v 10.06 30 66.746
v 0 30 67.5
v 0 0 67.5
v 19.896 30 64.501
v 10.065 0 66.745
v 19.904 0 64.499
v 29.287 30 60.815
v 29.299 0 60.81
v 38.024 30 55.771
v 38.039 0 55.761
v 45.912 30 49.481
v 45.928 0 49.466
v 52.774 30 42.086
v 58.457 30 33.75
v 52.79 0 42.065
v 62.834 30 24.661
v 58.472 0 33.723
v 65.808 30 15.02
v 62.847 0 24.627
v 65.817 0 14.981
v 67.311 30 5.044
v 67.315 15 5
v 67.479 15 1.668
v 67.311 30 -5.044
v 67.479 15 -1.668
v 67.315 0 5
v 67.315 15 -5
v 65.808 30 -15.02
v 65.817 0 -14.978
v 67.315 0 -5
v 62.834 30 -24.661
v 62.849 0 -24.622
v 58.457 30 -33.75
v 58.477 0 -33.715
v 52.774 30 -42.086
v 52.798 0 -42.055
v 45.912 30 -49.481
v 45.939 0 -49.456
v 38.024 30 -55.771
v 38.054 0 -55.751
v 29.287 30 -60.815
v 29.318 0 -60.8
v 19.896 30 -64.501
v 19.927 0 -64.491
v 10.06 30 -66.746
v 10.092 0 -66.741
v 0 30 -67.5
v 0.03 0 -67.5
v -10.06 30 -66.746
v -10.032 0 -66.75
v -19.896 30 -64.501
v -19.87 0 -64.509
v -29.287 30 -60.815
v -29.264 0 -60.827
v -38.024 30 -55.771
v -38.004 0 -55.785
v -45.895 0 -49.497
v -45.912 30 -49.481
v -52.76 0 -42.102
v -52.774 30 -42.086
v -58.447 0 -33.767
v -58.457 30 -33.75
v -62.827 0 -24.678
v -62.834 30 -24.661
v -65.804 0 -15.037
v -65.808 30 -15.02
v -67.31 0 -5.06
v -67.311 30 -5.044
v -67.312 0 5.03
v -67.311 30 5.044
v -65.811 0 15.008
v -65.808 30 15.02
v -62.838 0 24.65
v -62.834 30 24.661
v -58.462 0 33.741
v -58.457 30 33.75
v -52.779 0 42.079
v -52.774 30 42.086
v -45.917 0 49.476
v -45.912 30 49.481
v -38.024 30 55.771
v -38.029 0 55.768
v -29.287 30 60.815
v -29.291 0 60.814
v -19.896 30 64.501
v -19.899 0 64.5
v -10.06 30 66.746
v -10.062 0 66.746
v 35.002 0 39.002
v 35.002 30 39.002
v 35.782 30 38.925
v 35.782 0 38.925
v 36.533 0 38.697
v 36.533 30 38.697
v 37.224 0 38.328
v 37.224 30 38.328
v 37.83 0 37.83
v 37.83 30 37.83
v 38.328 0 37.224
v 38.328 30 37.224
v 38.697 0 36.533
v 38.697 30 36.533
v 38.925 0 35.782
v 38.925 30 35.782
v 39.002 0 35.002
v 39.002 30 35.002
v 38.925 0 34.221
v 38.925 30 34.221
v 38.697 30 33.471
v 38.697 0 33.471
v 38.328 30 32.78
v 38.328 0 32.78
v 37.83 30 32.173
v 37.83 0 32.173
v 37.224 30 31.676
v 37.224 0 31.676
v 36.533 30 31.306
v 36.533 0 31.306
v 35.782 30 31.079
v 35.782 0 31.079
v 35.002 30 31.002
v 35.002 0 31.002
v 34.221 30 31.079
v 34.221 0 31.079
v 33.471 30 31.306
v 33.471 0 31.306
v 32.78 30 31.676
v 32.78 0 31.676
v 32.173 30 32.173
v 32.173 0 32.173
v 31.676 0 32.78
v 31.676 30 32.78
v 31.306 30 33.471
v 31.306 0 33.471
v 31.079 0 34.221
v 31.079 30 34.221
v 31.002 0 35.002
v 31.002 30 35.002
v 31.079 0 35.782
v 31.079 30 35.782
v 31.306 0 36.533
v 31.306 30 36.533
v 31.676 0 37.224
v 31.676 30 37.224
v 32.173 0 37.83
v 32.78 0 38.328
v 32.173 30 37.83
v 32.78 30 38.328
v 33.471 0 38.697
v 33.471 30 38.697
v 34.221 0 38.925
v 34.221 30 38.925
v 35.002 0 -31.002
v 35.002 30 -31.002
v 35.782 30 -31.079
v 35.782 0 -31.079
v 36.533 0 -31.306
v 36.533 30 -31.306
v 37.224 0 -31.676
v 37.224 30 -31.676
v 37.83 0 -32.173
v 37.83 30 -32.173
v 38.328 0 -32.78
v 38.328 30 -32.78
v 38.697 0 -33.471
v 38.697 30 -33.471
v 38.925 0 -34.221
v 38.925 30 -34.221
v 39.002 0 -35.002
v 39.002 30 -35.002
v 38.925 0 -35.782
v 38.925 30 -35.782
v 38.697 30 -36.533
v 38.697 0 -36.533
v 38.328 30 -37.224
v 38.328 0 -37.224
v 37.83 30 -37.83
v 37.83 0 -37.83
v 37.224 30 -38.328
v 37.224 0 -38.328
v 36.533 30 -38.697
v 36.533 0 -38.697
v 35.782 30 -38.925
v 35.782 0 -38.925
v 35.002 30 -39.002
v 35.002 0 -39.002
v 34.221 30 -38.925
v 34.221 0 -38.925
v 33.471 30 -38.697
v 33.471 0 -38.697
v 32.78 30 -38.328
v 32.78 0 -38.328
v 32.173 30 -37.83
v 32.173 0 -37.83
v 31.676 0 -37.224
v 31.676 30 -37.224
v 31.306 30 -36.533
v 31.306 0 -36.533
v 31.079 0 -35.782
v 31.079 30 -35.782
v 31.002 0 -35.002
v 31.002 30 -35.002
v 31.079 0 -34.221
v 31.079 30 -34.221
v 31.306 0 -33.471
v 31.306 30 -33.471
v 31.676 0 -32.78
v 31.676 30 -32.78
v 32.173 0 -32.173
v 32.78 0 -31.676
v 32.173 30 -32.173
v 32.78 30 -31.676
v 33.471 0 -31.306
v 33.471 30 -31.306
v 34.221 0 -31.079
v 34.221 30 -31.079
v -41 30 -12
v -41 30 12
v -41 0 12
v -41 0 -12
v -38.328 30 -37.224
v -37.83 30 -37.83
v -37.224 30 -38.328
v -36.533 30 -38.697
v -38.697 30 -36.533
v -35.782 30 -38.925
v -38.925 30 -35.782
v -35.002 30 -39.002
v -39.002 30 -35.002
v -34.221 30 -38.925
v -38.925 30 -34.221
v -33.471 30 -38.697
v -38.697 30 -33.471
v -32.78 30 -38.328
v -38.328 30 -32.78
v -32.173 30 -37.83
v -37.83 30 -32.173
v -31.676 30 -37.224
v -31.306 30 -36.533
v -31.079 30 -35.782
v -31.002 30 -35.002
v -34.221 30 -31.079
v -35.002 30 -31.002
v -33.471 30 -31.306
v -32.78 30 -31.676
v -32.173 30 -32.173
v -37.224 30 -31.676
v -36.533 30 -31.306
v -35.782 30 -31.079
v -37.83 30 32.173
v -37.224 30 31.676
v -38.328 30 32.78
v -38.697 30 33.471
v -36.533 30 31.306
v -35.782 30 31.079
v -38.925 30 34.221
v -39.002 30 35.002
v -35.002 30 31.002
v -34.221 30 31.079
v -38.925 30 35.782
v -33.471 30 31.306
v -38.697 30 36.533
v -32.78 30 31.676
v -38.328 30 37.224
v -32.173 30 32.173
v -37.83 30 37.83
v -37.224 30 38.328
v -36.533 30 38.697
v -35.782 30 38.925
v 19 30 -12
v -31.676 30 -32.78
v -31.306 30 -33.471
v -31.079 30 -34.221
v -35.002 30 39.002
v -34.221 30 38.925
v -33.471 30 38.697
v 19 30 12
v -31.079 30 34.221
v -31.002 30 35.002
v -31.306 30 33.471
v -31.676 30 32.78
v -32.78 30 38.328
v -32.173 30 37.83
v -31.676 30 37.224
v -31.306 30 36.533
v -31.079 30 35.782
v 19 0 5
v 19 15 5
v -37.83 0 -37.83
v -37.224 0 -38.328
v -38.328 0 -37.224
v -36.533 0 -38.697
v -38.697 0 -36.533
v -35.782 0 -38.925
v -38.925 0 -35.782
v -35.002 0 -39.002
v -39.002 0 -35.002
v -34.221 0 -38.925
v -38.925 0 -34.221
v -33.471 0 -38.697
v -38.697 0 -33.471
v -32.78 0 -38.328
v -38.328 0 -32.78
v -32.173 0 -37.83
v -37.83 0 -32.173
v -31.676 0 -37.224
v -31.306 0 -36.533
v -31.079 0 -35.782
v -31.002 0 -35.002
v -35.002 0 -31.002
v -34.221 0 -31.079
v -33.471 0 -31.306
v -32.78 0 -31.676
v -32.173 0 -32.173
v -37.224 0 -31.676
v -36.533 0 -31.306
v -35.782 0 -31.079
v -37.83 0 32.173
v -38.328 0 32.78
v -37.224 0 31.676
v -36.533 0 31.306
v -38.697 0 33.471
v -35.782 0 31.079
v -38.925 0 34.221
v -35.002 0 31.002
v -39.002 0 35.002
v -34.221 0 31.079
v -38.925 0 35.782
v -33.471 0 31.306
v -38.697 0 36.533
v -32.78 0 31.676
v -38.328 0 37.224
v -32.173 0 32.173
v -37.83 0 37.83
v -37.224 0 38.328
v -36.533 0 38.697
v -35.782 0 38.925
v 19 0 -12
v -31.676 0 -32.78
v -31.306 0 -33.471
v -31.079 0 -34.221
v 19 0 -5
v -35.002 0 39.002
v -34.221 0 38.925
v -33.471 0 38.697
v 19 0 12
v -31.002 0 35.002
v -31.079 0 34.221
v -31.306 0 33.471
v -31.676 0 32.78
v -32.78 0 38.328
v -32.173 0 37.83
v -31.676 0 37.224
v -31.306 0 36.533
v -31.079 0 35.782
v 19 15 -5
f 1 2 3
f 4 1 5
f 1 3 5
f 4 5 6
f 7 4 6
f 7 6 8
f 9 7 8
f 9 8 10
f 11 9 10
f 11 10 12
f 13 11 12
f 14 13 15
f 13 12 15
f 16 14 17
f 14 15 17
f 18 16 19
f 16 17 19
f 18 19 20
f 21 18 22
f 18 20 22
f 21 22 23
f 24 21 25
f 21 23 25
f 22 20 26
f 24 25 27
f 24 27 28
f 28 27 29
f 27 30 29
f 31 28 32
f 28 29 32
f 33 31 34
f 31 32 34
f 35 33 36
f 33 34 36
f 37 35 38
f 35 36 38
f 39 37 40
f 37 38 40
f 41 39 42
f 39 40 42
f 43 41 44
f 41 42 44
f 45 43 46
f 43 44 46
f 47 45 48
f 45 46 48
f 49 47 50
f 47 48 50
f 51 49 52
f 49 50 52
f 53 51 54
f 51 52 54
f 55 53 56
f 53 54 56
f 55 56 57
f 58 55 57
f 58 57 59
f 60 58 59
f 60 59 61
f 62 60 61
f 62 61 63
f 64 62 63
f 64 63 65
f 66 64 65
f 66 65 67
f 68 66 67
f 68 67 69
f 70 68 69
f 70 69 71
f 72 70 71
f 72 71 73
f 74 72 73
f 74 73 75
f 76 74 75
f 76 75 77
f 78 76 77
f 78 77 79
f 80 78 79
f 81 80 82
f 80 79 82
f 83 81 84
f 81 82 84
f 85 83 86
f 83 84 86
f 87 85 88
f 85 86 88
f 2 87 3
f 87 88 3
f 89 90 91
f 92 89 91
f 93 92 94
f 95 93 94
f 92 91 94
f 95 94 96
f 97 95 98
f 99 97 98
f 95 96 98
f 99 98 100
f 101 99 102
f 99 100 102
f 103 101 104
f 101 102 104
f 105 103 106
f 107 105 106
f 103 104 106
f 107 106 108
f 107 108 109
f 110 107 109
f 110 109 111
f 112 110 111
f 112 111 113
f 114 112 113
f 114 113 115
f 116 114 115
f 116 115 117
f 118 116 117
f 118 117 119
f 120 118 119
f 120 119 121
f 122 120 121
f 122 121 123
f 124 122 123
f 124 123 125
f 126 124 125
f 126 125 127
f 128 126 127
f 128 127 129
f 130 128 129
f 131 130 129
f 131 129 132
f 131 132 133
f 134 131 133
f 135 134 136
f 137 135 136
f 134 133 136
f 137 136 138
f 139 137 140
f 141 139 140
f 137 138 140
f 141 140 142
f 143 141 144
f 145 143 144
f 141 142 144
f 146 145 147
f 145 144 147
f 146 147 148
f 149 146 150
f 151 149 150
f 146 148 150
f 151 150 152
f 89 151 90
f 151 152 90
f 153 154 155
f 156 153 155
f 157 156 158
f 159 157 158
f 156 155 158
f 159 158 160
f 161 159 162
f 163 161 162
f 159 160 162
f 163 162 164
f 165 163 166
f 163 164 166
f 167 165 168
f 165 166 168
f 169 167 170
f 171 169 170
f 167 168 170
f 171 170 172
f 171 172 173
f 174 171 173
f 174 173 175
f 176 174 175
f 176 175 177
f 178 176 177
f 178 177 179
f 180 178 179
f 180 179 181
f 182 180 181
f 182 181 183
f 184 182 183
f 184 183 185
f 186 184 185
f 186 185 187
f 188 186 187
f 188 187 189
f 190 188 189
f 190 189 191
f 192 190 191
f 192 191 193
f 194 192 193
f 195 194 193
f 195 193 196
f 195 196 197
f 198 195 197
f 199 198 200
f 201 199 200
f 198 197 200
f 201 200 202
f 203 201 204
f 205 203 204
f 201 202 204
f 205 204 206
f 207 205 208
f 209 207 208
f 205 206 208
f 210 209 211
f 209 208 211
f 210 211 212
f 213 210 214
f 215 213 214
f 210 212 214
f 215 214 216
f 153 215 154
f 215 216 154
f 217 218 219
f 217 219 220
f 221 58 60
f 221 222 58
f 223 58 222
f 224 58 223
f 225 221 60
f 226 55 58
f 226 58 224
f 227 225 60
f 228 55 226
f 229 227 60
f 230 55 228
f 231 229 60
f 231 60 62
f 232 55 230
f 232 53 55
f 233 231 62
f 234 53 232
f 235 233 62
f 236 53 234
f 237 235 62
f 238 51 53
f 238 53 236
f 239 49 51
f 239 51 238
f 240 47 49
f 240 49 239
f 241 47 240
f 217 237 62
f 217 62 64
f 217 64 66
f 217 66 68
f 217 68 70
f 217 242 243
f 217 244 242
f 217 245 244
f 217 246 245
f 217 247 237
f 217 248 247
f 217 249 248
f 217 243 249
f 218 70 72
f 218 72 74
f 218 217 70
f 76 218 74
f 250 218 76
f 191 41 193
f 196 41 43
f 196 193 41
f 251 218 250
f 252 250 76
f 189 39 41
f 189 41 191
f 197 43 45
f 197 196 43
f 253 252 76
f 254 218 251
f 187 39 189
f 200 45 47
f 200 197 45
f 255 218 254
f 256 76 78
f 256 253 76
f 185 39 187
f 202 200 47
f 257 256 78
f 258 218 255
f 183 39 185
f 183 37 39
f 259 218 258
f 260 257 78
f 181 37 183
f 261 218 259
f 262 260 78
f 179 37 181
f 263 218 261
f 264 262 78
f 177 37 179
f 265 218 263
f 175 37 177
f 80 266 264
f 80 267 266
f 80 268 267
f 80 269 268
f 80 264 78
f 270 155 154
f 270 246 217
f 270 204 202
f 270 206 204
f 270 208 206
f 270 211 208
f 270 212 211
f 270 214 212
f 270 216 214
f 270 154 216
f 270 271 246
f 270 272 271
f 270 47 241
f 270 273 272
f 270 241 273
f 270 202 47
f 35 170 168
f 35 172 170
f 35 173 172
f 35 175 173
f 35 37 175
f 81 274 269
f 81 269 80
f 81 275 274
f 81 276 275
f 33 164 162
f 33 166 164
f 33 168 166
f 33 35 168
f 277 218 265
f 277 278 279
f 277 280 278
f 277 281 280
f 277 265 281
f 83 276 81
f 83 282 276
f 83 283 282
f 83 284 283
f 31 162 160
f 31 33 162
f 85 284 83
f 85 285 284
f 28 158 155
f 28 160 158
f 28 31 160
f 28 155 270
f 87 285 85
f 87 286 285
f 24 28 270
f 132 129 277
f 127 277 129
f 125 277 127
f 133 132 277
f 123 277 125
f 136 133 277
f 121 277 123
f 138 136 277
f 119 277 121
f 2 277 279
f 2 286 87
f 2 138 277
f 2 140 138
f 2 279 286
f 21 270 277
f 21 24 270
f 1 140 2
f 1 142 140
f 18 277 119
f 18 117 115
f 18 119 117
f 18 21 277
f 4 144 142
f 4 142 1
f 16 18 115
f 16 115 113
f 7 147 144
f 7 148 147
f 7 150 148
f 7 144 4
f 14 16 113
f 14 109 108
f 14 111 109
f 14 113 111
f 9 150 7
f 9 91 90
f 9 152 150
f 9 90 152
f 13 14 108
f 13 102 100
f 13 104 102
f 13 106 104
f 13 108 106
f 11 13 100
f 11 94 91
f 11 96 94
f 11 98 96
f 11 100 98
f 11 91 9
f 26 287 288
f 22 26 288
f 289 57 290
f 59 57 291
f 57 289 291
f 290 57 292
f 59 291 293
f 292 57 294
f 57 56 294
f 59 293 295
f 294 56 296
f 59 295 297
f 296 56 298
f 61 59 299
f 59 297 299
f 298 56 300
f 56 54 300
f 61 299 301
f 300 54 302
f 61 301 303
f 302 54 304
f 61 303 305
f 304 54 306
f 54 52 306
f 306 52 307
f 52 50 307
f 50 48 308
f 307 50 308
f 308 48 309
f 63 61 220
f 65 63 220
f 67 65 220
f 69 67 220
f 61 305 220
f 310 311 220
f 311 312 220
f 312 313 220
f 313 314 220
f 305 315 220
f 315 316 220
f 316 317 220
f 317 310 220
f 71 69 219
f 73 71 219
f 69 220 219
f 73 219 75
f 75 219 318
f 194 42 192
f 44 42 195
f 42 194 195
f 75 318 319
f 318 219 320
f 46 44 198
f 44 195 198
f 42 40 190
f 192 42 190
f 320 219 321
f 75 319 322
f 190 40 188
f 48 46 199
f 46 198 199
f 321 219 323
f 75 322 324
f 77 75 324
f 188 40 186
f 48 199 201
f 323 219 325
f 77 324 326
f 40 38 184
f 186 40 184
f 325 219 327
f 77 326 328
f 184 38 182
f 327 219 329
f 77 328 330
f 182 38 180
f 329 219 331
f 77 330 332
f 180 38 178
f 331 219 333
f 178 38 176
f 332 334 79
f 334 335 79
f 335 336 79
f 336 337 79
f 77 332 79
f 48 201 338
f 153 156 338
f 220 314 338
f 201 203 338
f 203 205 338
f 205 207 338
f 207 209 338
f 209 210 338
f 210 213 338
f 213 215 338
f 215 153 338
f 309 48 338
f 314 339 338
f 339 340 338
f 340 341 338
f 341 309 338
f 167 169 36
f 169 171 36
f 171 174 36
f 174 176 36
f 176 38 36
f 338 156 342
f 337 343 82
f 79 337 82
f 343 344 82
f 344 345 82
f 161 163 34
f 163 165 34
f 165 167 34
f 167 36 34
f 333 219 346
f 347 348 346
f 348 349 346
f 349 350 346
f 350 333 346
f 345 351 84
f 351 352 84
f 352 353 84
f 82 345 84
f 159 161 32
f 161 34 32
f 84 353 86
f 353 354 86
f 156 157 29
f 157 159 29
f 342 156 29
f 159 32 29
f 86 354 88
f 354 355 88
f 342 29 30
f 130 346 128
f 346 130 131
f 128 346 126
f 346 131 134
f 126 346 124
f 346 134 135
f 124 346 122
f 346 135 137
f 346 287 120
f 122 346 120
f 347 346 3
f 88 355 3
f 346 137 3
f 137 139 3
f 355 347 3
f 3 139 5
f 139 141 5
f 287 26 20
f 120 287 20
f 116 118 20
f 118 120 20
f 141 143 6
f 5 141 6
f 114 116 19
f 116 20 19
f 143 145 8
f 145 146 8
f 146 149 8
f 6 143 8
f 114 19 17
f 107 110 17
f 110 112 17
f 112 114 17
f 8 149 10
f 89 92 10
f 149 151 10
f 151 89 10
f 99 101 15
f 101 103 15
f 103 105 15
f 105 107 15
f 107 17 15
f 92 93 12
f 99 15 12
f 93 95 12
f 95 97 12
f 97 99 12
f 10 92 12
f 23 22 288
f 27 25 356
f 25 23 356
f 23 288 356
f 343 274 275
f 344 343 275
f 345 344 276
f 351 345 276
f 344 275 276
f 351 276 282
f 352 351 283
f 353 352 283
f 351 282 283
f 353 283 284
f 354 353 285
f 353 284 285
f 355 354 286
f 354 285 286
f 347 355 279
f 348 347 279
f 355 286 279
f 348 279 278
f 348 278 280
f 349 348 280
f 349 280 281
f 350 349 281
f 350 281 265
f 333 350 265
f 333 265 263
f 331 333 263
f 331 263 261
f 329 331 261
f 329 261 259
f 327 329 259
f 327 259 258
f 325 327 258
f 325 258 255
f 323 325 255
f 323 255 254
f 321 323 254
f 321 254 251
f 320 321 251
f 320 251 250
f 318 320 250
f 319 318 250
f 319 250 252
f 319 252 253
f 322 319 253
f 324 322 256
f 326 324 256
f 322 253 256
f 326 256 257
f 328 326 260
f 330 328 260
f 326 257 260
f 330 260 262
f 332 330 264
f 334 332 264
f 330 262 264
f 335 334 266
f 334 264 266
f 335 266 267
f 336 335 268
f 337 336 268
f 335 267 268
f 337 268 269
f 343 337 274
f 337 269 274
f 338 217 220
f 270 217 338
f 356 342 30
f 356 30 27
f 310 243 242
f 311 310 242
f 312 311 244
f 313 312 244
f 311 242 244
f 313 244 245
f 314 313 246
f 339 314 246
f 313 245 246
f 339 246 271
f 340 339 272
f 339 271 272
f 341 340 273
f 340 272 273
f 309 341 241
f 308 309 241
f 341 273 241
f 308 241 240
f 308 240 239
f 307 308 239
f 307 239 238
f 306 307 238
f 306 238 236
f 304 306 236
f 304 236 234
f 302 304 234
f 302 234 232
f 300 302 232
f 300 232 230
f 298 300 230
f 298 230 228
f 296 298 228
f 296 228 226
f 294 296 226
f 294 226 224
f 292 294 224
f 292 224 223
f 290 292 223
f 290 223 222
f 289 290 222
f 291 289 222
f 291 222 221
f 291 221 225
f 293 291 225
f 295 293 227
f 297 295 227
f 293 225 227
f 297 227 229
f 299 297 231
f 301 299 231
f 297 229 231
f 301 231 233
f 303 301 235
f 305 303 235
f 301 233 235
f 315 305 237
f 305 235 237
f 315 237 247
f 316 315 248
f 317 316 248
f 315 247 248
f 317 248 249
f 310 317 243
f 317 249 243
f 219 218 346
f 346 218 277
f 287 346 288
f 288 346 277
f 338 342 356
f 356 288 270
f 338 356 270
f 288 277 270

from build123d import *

# Parameters (mm, degrees)
SKETCH_1_R          = 67.5
EXTRUDE_1_DEPTH     = 30
SKETCH_2_W          = 60
SKETCH_2_H          = 24
CUT_EXTRUDE_1_DEPTH = 101.062480481
SKETCH_3_W          = 10
SKETCH_3_H          = 15
CUT_EXTRUDE_2_DEPTH = 97
SKETCH_4_R          = 4
CUT_EXTRUDE_3_DEPTH = 101.062480481


with BuildPart() as part:
    # 草图1 → 凸台-拉伸1 (new body)
    with BuildSketch(Plane(origin=(0, 0, 0), x_dir=(1, 0, 0), z_dir=(0, 1, 0))):
        with Locations(Location((0, 0, 0), (0, 0, 270))):
            Circle(SKETCH_1_R)
    extrude(amount=EXTRUDE_1_DEPTH)

    # 草图2 → 切除-拉伸1 (cut, through all)
    with BuildSketch(Plane(origin=(0, 30, 0), x_dir=(1, 0, 0), z_dir=(0, 1, 0))):
        with Locations((-11, 0)):
            Rectangle(SKETCH_2_W, SKETCH_2_H)
    extrude(amount=-CUT_EXTRUDE_1_DEPTH, mode=Mode.SUBTRACT)

    # 草图3 → 切除-拉伸2 (cut)
    with BuildSketch(Plane(origin=(0, 0, 0), x_dir=(0, 0, -1), z_dir=(1, 0, 0))):
        with Locations((0, 7.5)):
            Rectangle(SKETCH_3_W, SKETCH_3_H)
    extrude(amount=CUT_EXTRUDE_2_DEPTH, mode=Mode.SUBTRACT)

    # 草图4 → 切除-拉伸3 (cut, through all)
    with BuildSketch(Plane(origin=(0, 30, 0), x_dir=(1, 0, 0), z_dir=(0, 1, 0))):
        with Locations(Location((35.001785669, 35.001785669, 0), (0, 0, 270))):
            Circle(SKETCH_4_R)
        with Locations(Location((35.001785669, -35.001785669, 0), (0, 0, 270))):
            Circle(SKETCH_4_R)
        with Locations(Location((-35.001785669, -35.001785669, 0), (0, 0, 270))):
            Circle(SKETCH_4_R)
        with Locations(Location((-35.001785669, 35.001785669, 0), (0, 0, 270))):
            Circle(SKETCH_4_R)
    extrude(amount=-CUT_EXTRUDE_3_DEPTH, mode=Mode.SUBTRACT)


solid = part.part
